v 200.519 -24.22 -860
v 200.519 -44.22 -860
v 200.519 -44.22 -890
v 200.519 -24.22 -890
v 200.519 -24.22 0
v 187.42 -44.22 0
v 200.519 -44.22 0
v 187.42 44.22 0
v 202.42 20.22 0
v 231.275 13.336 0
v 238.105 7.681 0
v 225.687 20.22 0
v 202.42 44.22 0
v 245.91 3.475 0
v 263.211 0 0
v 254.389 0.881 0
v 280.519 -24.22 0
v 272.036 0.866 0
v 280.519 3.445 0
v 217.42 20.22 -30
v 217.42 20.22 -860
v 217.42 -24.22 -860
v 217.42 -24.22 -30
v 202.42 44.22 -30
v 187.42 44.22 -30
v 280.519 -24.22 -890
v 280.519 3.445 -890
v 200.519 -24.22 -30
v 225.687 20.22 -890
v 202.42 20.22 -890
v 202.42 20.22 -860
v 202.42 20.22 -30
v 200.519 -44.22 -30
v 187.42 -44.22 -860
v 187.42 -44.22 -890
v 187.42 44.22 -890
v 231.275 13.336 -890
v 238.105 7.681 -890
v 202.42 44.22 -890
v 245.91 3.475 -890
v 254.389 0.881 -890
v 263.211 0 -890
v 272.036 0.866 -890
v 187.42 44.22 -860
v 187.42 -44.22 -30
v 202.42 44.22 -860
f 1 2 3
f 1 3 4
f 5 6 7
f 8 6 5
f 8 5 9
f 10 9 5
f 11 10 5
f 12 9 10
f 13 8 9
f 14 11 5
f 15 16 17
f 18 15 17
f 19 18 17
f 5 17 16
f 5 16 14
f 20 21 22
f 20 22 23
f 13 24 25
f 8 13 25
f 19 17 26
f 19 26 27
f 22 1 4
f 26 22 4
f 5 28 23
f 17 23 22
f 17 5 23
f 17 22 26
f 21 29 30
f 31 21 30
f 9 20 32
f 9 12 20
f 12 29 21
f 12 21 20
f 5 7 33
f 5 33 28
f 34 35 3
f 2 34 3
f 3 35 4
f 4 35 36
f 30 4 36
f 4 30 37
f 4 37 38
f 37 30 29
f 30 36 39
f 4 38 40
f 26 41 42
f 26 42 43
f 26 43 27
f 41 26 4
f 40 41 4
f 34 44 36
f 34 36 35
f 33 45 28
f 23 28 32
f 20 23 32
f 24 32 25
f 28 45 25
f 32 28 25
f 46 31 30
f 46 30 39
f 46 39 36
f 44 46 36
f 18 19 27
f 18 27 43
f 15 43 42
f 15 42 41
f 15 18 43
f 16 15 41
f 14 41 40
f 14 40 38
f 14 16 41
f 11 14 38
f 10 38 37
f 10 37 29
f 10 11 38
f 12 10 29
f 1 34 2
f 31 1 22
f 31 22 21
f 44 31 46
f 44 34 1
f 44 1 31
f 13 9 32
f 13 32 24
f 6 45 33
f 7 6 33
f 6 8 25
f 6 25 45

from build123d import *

# Parameters (mm, degrees)
BOSS_EXTRUDE1_DEPTH = 890
SKETCH2_W           = 830
SKETCH2_H           = 88.44
CUT_EXTRUDE1_DEPTH  = 30


with BuildPart() as part:
    # Sketch1 → Boss-Extrude1 (new body)
    with BuildSketch(Plane.XY):
        with BuildLine():
            Line((187.42, 44.22), (187.42, -44.22))
            Line((187.42, -44.22), (200.51881238, -44.22))
            Line((200.51881238, -44.22), (200.51881238, -24.22))
            Line((200.51881238, -24.22), (280.51881238, -24.22))
            Line((280.51881238, -24.22), (280.51881238, 3.445359838))
            ThreePointArc((280.51881238, 3.445359838), (250.085390083, 1.968696909), (225.68736431, 20.22))
            Line((225.68736431, 20.22), (202.42, 20.22))
            Line((202.42, 20.22), (202.42, 44.22))
            Line((202.42, 44.22), (187.42, 44.22))
        make_face()
    extrude(amount=-BOSS_EXTRUDE1_DEPTH)

    # Sketch2 → Cut-Extrude1 (cut)
    with BuildSketch(Plane.ZY.offset(-187.42)):
        with Locations((-445, 0)):
            Rectangle(SKETCH2_W, SKETCH2_H)
    extrude(amount=-CUT_EXTRUDE1_DEPTH, mode=Mode.SUBTRACT)


solid = part.part
